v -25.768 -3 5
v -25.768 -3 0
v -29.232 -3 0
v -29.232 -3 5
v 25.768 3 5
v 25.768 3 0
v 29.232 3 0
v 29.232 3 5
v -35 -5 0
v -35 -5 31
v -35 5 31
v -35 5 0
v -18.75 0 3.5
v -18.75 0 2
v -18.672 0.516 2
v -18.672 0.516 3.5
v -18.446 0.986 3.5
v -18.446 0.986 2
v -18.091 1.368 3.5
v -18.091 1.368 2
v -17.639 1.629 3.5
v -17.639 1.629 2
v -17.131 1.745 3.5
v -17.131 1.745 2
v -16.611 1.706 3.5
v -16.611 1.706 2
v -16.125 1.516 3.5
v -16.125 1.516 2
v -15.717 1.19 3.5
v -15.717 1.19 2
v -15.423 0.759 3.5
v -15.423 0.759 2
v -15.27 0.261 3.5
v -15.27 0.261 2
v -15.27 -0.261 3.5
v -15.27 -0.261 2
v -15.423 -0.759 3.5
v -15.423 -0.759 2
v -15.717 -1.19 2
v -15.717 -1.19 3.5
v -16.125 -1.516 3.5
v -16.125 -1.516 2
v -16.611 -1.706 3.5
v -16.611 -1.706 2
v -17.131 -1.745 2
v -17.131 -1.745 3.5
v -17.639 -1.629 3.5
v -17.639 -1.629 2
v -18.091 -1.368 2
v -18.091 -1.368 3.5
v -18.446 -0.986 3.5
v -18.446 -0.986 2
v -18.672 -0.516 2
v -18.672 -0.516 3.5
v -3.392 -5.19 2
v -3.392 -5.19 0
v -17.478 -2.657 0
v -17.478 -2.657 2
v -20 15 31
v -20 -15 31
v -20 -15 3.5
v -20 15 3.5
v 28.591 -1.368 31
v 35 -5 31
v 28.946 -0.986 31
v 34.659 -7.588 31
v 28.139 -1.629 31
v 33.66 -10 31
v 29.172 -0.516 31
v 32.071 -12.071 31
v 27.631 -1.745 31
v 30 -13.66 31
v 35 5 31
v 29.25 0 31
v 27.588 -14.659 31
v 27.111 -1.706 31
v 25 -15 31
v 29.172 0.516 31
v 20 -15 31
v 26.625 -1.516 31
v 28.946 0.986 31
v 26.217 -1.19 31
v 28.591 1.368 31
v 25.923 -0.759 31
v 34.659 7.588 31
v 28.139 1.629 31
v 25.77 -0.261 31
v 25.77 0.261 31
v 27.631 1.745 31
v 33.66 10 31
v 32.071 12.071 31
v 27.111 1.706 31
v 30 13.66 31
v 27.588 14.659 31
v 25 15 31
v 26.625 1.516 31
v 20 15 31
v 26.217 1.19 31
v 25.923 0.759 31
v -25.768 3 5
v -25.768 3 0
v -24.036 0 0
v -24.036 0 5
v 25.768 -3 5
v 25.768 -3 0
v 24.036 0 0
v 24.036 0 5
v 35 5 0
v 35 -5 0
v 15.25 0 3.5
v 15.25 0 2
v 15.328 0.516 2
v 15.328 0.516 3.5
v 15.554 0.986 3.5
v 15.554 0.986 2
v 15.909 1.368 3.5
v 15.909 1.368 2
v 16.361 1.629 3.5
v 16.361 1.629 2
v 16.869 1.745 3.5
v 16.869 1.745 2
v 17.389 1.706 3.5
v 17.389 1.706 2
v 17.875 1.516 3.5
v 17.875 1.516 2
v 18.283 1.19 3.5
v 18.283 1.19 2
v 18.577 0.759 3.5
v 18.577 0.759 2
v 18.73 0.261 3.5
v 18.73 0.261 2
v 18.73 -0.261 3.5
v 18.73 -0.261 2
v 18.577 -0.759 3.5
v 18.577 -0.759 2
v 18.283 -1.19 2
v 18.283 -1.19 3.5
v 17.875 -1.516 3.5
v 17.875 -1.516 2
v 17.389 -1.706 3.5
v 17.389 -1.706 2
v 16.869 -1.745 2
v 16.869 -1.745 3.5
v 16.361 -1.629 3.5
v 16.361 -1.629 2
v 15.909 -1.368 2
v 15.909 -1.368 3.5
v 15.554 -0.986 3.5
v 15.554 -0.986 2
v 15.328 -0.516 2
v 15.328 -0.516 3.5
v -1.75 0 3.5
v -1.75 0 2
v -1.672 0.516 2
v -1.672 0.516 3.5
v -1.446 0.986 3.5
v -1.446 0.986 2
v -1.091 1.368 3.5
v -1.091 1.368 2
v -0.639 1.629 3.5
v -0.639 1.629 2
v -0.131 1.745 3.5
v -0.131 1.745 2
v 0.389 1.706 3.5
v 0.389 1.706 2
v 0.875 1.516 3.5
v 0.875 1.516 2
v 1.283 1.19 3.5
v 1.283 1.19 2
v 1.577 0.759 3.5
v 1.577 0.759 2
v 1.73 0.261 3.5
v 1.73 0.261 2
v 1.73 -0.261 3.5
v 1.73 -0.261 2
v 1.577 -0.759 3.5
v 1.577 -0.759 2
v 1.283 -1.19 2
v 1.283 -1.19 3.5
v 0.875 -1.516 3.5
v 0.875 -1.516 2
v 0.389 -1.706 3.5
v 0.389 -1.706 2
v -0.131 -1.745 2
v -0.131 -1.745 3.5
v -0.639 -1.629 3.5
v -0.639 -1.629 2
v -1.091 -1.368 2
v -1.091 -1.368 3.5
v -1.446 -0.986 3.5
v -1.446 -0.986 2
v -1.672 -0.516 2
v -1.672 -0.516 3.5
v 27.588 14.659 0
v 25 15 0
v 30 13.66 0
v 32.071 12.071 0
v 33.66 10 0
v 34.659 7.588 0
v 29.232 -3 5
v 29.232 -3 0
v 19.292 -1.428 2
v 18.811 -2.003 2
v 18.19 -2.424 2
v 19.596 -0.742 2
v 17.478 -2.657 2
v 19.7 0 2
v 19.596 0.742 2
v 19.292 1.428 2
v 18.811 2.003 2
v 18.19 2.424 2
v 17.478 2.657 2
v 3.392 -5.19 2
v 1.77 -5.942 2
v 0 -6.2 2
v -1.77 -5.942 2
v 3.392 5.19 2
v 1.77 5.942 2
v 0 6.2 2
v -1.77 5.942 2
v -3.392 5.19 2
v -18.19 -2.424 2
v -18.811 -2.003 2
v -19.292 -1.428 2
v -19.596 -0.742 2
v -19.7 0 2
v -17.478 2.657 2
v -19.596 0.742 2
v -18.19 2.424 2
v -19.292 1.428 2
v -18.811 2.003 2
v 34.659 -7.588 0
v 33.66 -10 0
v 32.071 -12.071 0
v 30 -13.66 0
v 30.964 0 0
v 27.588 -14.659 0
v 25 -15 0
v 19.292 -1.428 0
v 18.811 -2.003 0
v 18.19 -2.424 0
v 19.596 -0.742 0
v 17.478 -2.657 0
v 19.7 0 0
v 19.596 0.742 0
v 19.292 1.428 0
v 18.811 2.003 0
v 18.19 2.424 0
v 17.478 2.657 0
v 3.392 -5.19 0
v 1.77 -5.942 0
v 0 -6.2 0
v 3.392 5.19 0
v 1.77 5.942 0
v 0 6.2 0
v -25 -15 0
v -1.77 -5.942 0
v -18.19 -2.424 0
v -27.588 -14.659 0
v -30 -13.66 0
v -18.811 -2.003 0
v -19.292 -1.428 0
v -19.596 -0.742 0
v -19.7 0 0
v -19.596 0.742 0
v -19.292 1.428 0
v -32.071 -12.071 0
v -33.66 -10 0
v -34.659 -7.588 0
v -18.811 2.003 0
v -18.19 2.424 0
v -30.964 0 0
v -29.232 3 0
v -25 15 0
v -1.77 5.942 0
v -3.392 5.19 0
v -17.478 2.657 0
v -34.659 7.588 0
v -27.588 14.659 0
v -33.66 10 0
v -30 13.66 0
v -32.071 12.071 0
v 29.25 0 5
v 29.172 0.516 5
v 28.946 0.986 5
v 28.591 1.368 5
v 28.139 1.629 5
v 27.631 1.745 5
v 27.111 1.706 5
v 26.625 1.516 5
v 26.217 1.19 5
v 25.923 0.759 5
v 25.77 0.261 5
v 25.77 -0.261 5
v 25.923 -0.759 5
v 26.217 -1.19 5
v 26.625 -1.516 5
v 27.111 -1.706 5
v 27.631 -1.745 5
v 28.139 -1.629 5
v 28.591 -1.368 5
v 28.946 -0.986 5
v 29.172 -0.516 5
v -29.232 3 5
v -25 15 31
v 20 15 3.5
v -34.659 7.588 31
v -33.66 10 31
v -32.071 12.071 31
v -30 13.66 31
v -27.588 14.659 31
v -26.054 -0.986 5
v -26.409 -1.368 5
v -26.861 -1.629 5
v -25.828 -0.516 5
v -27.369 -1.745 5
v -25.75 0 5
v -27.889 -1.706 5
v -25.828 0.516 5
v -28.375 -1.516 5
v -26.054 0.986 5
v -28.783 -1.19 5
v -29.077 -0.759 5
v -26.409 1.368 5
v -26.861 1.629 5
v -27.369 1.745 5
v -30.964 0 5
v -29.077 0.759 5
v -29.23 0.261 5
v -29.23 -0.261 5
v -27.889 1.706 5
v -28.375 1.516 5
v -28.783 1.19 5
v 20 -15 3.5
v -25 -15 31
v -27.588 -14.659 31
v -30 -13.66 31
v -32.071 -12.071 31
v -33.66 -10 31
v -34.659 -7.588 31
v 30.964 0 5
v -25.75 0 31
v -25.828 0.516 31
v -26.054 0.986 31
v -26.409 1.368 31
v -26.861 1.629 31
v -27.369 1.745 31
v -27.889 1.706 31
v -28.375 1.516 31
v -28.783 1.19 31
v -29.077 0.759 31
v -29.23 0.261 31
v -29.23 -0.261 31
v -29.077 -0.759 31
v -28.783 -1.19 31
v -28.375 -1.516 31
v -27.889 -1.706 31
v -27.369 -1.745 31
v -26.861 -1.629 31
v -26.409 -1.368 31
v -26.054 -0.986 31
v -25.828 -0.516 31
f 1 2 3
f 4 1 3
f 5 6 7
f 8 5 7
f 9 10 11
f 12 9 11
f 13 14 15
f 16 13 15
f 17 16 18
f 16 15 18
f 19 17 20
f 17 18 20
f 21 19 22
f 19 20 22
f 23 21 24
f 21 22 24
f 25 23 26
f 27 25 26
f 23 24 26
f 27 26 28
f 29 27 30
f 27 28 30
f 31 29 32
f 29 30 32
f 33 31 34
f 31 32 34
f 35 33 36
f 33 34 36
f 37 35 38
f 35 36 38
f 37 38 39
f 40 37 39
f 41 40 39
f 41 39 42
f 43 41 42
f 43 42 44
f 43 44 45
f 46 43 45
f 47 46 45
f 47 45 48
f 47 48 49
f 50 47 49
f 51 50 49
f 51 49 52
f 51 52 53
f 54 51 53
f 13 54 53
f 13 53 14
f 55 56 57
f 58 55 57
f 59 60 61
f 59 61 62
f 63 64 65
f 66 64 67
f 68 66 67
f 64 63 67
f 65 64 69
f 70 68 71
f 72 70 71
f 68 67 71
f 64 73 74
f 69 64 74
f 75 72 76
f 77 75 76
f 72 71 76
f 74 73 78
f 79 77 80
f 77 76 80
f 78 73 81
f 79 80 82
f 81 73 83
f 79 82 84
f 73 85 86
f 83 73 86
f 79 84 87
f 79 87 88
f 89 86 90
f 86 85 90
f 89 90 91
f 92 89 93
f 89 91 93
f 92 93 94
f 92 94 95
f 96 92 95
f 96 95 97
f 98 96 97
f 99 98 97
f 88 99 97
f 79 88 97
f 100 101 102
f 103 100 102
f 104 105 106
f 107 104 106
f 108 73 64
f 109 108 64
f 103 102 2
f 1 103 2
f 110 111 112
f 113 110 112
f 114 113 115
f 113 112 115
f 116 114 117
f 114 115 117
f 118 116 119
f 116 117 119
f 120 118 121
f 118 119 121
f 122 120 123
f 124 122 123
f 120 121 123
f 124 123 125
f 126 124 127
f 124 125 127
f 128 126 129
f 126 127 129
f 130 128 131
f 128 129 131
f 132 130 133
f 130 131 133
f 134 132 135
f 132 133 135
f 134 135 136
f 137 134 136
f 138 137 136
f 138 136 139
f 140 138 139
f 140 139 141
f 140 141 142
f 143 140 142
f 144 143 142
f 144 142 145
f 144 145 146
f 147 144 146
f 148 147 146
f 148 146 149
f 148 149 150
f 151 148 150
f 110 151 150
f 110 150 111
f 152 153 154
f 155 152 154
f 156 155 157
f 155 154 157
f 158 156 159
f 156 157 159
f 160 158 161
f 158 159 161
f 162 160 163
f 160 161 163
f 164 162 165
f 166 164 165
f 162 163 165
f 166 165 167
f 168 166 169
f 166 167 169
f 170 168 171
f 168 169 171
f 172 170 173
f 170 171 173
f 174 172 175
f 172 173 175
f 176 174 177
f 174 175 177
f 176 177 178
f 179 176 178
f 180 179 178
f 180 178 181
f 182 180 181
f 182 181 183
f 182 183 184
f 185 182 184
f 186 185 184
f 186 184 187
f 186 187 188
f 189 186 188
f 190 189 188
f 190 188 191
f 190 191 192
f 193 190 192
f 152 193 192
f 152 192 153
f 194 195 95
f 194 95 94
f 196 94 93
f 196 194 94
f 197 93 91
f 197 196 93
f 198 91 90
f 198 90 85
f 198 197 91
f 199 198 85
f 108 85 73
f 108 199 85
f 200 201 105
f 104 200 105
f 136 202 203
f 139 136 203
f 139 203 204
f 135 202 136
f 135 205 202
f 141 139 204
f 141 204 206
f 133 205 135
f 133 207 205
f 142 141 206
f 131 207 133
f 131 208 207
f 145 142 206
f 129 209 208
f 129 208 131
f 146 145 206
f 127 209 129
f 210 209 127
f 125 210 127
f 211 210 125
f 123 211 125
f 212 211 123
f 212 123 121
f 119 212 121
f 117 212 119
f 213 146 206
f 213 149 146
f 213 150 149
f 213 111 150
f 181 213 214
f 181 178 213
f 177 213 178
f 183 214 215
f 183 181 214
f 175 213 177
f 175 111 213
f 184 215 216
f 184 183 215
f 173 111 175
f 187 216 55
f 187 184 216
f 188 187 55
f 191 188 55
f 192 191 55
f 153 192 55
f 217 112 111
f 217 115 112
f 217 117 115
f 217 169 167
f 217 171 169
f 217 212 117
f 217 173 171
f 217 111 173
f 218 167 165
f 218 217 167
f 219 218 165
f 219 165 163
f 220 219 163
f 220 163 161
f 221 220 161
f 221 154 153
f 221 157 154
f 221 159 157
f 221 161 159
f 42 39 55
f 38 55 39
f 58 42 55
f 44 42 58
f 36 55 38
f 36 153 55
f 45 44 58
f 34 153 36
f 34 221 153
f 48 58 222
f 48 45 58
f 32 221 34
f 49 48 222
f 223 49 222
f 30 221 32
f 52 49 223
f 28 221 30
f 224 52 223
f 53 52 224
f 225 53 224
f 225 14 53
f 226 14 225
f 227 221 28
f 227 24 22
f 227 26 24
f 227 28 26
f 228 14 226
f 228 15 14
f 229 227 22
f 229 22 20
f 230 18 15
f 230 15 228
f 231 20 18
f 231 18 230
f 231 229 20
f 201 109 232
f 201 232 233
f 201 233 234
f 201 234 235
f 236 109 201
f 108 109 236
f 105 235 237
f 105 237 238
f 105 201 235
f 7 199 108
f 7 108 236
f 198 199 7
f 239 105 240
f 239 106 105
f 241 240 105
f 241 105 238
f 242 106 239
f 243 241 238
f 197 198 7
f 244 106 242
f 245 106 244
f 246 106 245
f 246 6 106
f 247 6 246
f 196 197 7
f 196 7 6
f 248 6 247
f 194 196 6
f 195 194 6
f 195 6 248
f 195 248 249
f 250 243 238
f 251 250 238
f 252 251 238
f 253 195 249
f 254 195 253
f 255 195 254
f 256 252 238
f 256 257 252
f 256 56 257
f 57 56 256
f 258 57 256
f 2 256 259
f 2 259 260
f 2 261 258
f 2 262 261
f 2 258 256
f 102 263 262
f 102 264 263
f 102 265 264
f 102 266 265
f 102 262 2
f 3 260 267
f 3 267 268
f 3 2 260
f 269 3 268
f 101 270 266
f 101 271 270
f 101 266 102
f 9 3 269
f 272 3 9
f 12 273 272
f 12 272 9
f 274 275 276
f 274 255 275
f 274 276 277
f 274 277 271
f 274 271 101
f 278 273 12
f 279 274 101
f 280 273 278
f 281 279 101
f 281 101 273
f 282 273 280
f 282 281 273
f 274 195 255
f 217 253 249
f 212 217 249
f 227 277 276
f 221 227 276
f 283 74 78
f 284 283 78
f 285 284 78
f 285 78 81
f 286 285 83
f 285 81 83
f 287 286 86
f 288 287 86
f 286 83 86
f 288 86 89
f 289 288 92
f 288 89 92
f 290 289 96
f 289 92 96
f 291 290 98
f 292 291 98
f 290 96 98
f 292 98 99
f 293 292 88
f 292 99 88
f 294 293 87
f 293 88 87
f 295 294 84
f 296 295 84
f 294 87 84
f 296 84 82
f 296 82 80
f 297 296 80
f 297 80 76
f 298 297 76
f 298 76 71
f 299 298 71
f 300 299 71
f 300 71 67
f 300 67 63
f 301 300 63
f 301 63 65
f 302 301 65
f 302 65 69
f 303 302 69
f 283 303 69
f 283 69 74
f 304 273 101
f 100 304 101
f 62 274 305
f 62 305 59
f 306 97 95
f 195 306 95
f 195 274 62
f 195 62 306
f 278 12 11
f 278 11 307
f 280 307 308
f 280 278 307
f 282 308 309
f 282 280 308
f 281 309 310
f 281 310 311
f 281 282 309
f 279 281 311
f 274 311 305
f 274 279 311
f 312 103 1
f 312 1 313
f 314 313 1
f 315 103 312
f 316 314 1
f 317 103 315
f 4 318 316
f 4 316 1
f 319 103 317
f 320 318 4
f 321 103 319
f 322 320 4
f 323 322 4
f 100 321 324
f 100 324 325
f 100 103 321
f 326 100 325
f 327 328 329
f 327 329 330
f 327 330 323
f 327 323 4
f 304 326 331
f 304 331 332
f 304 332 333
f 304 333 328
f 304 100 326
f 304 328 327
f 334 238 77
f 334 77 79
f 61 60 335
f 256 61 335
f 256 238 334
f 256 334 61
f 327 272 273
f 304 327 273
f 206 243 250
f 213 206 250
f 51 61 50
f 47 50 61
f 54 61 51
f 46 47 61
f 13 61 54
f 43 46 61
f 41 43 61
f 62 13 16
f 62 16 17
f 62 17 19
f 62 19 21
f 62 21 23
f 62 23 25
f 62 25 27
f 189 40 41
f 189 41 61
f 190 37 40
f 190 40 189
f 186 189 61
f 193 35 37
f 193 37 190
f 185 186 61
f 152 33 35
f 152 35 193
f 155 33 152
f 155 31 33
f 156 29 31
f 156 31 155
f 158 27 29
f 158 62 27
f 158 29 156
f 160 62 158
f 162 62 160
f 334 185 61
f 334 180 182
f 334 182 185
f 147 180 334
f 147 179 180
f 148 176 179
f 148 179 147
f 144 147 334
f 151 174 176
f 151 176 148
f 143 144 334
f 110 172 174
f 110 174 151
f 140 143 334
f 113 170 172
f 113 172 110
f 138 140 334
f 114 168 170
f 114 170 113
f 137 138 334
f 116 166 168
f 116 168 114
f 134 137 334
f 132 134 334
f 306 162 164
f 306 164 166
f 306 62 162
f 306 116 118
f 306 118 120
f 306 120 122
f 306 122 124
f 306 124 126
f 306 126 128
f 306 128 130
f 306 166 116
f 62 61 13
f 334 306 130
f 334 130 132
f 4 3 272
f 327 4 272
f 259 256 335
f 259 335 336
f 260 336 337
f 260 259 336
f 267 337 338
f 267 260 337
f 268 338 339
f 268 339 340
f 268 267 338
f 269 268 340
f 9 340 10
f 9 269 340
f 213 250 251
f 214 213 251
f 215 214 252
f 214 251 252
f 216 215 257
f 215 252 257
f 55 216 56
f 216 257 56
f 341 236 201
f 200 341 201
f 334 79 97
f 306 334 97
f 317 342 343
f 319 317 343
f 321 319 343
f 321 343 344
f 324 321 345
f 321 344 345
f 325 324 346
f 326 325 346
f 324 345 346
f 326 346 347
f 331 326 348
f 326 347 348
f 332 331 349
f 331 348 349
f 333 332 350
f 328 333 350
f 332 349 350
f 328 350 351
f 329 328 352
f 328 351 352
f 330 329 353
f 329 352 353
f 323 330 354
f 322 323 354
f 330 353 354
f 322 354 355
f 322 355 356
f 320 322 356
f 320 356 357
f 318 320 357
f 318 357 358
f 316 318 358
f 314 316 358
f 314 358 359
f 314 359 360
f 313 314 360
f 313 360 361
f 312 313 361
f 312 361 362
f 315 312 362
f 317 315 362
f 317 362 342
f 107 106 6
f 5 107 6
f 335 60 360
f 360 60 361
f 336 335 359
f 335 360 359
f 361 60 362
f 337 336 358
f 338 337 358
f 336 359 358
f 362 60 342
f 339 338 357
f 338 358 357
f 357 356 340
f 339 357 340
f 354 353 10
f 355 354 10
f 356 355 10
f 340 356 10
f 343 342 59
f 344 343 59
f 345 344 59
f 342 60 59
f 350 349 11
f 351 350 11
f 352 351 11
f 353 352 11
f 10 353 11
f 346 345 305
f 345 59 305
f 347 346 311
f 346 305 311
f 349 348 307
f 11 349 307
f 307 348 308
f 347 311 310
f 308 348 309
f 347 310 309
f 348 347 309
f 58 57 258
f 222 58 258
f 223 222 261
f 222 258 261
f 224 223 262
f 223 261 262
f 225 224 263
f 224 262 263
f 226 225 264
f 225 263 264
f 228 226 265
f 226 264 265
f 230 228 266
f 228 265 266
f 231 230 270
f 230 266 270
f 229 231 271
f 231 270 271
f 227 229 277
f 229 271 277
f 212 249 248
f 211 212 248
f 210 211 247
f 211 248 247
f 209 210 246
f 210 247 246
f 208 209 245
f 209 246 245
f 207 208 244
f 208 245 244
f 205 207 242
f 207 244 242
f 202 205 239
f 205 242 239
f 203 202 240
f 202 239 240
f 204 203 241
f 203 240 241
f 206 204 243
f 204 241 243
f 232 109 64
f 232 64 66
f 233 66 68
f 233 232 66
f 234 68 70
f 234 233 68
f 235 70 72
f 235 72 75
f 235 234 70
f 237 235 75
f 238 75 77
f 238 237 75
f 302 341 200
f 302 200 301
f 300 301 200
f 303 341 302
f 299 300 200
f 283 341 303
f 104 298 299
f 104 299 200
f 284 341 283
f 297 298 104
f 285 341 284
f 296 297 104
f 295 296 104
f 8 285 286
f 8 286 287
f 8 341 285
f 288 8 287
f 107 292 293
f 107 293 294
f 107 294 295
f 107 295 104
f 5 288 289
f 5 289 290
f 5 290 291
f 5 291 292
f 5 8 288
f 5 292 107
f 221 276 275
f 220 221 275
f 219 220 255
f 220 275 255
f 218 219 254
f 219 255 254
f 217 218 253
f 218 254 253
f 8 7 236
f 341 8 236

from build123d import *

# Parameters (mm, degrees)
BOSS_EXTRUDE1_DEPTH = 31
SKETCH2_W           = 40
SKETCH2_H           = 30
CUT_EXTRUDE1_DEPTH  = 27.5
SKETCH3_R           = 1.75
CUT_EXTRUDE2_DEPTH  = 32
CUT_EXTRUDE3_DEPTH  = 5
CUT_EXTRUDE4_DEPTH  = 2
SKETCH6_R           = 1.75
CUT_EXTRUDE5_DEPTH  = 32


with BuildPart() as part:
    # Sketch1 → Boss-Extrude1 (new body)
    with BuildSketch(Plane.XY):
        with BuildLine():
            Line((-25, 15), (25, 15))
            ThreePointArc((25, 15), (32.071067812, 12.071067812), (35, 5))
            Line((35, 5), (35, -5))
            ThreePointArc((35, -5), (32.071067812, -12.071067812), (25, -15))
            Line((25, -15), (-25, -15))
            ThreePointArc((-25, -15), (-32.071067812, -12.071067812), (-35, -5))
            Line((-35, -5), (-35, 5))
            ThreePointArc((-35, 5), (-32.071067812, 12.071067812), (-25, 15))
        make_face()
    extrude(amount=BOSS_EXTRUDE1_DEPTH)

    # Sketch2 → Cut-Extrude1 (cut)
    with BuildSketch(Plane.XY.offset(31)):
        Rectangle(SKETCH2_W, SKETCH2_H)
    extrude(amount=-CUT_EXTRUDE1_DEPTH, mode=Mode.SUBTRACT)

    # Sketch3 → Cut-Extrude2 (cut, through all)
    with BuildSketch(Plane.XY.offset(31)):
        with Locations((-27.5, 0)):
            Circle(SKETCH3_R)
        with Locations((27.5, 0)):
            Circle(SKETCH3_R)
    extrude(amount=-CUT_EXTRUDE2_DEPTH, mode=Mode.SUBTRACT)

    # Sketch4 → Cut-Extrude3 (cut)
    with BuildSketch(Plane(origin=(0, 0, 0), x_dir=(-1, 0, 0), z_dir=(0, 0, -1))):
        Polygon((-24.035898385, 0), (-25.767949192, 3), (-29.232050808, 3), (-30.964101615, 0), (-29.232050808, -3), (-25.767949192, -3), align=None)
        Polygon((24.035898385, 0), (25.767949192, -3), (29.232050808, -3), (30.964101615, 0), (29.232050808, 3), (25.767949192, 3), align=None)
    extrude(amount=-CUT_EXTRUDE3_DEPTH, mode=Mode.SUBTRACT)

    # Sketch5 → Cut-Extrude4 (cut)
    with BuildSketch(Plane(origin=(0, 0, 0), x_dir=(-1, 0, 0), z_dir=(0, 0, -1))):
        with BuildLine():
            Line((-17.477732777, -2.657399367), (-3.39236806, -5.189589478))
            ThreePointArc((-3.39236806, -5.189589478), (0, -6.2), (3.39236806, -5.189589478))
            Line((3.39236806, -5.189589478), (17.477732777, -2.657399367))
            ThreePointArc((17.477732777, -2.657399367), (19.7, 0), (17.477732777, 2.657399367))
            Line((17.477732777, 2.657399367), (3.39236806, 5.189589478))
            ThreePointArc((3.39236806, 5.189589478), (0, 6.2), (-3.39236806, 5.189589478))
            Line((-3.39236806, 5.189589478), (-17.477732777, 2.657399367))
            ThreePointArc((-17.477732777, 2.657399367), (-19.7, 0), (-17.477732777, -2.657399367))
        make_face()
    extrude(amount=-CUT_EXTRUDE4_DEPTH, mode=Mode.SUBTRACT)

    # Sketch6 → Cut-Extrude5 (cut, through all)
    with BuildSketch(Plane(origin=(0, 0, 0), x_dir=(-1, 0, 0), z_dir=(0, 0, -1))):
        Circle(SKETCH6_R)
        with Locations((-17, 0)):
            Circle(SKETCH6_R)
        with Locations((17, 0)):
            Circle(SKETCH6_R)
    extrude(amount=-CUT_EXTRUDE5_DEPTH, mode=Mode.SUBTRACT)


solid = part.part
